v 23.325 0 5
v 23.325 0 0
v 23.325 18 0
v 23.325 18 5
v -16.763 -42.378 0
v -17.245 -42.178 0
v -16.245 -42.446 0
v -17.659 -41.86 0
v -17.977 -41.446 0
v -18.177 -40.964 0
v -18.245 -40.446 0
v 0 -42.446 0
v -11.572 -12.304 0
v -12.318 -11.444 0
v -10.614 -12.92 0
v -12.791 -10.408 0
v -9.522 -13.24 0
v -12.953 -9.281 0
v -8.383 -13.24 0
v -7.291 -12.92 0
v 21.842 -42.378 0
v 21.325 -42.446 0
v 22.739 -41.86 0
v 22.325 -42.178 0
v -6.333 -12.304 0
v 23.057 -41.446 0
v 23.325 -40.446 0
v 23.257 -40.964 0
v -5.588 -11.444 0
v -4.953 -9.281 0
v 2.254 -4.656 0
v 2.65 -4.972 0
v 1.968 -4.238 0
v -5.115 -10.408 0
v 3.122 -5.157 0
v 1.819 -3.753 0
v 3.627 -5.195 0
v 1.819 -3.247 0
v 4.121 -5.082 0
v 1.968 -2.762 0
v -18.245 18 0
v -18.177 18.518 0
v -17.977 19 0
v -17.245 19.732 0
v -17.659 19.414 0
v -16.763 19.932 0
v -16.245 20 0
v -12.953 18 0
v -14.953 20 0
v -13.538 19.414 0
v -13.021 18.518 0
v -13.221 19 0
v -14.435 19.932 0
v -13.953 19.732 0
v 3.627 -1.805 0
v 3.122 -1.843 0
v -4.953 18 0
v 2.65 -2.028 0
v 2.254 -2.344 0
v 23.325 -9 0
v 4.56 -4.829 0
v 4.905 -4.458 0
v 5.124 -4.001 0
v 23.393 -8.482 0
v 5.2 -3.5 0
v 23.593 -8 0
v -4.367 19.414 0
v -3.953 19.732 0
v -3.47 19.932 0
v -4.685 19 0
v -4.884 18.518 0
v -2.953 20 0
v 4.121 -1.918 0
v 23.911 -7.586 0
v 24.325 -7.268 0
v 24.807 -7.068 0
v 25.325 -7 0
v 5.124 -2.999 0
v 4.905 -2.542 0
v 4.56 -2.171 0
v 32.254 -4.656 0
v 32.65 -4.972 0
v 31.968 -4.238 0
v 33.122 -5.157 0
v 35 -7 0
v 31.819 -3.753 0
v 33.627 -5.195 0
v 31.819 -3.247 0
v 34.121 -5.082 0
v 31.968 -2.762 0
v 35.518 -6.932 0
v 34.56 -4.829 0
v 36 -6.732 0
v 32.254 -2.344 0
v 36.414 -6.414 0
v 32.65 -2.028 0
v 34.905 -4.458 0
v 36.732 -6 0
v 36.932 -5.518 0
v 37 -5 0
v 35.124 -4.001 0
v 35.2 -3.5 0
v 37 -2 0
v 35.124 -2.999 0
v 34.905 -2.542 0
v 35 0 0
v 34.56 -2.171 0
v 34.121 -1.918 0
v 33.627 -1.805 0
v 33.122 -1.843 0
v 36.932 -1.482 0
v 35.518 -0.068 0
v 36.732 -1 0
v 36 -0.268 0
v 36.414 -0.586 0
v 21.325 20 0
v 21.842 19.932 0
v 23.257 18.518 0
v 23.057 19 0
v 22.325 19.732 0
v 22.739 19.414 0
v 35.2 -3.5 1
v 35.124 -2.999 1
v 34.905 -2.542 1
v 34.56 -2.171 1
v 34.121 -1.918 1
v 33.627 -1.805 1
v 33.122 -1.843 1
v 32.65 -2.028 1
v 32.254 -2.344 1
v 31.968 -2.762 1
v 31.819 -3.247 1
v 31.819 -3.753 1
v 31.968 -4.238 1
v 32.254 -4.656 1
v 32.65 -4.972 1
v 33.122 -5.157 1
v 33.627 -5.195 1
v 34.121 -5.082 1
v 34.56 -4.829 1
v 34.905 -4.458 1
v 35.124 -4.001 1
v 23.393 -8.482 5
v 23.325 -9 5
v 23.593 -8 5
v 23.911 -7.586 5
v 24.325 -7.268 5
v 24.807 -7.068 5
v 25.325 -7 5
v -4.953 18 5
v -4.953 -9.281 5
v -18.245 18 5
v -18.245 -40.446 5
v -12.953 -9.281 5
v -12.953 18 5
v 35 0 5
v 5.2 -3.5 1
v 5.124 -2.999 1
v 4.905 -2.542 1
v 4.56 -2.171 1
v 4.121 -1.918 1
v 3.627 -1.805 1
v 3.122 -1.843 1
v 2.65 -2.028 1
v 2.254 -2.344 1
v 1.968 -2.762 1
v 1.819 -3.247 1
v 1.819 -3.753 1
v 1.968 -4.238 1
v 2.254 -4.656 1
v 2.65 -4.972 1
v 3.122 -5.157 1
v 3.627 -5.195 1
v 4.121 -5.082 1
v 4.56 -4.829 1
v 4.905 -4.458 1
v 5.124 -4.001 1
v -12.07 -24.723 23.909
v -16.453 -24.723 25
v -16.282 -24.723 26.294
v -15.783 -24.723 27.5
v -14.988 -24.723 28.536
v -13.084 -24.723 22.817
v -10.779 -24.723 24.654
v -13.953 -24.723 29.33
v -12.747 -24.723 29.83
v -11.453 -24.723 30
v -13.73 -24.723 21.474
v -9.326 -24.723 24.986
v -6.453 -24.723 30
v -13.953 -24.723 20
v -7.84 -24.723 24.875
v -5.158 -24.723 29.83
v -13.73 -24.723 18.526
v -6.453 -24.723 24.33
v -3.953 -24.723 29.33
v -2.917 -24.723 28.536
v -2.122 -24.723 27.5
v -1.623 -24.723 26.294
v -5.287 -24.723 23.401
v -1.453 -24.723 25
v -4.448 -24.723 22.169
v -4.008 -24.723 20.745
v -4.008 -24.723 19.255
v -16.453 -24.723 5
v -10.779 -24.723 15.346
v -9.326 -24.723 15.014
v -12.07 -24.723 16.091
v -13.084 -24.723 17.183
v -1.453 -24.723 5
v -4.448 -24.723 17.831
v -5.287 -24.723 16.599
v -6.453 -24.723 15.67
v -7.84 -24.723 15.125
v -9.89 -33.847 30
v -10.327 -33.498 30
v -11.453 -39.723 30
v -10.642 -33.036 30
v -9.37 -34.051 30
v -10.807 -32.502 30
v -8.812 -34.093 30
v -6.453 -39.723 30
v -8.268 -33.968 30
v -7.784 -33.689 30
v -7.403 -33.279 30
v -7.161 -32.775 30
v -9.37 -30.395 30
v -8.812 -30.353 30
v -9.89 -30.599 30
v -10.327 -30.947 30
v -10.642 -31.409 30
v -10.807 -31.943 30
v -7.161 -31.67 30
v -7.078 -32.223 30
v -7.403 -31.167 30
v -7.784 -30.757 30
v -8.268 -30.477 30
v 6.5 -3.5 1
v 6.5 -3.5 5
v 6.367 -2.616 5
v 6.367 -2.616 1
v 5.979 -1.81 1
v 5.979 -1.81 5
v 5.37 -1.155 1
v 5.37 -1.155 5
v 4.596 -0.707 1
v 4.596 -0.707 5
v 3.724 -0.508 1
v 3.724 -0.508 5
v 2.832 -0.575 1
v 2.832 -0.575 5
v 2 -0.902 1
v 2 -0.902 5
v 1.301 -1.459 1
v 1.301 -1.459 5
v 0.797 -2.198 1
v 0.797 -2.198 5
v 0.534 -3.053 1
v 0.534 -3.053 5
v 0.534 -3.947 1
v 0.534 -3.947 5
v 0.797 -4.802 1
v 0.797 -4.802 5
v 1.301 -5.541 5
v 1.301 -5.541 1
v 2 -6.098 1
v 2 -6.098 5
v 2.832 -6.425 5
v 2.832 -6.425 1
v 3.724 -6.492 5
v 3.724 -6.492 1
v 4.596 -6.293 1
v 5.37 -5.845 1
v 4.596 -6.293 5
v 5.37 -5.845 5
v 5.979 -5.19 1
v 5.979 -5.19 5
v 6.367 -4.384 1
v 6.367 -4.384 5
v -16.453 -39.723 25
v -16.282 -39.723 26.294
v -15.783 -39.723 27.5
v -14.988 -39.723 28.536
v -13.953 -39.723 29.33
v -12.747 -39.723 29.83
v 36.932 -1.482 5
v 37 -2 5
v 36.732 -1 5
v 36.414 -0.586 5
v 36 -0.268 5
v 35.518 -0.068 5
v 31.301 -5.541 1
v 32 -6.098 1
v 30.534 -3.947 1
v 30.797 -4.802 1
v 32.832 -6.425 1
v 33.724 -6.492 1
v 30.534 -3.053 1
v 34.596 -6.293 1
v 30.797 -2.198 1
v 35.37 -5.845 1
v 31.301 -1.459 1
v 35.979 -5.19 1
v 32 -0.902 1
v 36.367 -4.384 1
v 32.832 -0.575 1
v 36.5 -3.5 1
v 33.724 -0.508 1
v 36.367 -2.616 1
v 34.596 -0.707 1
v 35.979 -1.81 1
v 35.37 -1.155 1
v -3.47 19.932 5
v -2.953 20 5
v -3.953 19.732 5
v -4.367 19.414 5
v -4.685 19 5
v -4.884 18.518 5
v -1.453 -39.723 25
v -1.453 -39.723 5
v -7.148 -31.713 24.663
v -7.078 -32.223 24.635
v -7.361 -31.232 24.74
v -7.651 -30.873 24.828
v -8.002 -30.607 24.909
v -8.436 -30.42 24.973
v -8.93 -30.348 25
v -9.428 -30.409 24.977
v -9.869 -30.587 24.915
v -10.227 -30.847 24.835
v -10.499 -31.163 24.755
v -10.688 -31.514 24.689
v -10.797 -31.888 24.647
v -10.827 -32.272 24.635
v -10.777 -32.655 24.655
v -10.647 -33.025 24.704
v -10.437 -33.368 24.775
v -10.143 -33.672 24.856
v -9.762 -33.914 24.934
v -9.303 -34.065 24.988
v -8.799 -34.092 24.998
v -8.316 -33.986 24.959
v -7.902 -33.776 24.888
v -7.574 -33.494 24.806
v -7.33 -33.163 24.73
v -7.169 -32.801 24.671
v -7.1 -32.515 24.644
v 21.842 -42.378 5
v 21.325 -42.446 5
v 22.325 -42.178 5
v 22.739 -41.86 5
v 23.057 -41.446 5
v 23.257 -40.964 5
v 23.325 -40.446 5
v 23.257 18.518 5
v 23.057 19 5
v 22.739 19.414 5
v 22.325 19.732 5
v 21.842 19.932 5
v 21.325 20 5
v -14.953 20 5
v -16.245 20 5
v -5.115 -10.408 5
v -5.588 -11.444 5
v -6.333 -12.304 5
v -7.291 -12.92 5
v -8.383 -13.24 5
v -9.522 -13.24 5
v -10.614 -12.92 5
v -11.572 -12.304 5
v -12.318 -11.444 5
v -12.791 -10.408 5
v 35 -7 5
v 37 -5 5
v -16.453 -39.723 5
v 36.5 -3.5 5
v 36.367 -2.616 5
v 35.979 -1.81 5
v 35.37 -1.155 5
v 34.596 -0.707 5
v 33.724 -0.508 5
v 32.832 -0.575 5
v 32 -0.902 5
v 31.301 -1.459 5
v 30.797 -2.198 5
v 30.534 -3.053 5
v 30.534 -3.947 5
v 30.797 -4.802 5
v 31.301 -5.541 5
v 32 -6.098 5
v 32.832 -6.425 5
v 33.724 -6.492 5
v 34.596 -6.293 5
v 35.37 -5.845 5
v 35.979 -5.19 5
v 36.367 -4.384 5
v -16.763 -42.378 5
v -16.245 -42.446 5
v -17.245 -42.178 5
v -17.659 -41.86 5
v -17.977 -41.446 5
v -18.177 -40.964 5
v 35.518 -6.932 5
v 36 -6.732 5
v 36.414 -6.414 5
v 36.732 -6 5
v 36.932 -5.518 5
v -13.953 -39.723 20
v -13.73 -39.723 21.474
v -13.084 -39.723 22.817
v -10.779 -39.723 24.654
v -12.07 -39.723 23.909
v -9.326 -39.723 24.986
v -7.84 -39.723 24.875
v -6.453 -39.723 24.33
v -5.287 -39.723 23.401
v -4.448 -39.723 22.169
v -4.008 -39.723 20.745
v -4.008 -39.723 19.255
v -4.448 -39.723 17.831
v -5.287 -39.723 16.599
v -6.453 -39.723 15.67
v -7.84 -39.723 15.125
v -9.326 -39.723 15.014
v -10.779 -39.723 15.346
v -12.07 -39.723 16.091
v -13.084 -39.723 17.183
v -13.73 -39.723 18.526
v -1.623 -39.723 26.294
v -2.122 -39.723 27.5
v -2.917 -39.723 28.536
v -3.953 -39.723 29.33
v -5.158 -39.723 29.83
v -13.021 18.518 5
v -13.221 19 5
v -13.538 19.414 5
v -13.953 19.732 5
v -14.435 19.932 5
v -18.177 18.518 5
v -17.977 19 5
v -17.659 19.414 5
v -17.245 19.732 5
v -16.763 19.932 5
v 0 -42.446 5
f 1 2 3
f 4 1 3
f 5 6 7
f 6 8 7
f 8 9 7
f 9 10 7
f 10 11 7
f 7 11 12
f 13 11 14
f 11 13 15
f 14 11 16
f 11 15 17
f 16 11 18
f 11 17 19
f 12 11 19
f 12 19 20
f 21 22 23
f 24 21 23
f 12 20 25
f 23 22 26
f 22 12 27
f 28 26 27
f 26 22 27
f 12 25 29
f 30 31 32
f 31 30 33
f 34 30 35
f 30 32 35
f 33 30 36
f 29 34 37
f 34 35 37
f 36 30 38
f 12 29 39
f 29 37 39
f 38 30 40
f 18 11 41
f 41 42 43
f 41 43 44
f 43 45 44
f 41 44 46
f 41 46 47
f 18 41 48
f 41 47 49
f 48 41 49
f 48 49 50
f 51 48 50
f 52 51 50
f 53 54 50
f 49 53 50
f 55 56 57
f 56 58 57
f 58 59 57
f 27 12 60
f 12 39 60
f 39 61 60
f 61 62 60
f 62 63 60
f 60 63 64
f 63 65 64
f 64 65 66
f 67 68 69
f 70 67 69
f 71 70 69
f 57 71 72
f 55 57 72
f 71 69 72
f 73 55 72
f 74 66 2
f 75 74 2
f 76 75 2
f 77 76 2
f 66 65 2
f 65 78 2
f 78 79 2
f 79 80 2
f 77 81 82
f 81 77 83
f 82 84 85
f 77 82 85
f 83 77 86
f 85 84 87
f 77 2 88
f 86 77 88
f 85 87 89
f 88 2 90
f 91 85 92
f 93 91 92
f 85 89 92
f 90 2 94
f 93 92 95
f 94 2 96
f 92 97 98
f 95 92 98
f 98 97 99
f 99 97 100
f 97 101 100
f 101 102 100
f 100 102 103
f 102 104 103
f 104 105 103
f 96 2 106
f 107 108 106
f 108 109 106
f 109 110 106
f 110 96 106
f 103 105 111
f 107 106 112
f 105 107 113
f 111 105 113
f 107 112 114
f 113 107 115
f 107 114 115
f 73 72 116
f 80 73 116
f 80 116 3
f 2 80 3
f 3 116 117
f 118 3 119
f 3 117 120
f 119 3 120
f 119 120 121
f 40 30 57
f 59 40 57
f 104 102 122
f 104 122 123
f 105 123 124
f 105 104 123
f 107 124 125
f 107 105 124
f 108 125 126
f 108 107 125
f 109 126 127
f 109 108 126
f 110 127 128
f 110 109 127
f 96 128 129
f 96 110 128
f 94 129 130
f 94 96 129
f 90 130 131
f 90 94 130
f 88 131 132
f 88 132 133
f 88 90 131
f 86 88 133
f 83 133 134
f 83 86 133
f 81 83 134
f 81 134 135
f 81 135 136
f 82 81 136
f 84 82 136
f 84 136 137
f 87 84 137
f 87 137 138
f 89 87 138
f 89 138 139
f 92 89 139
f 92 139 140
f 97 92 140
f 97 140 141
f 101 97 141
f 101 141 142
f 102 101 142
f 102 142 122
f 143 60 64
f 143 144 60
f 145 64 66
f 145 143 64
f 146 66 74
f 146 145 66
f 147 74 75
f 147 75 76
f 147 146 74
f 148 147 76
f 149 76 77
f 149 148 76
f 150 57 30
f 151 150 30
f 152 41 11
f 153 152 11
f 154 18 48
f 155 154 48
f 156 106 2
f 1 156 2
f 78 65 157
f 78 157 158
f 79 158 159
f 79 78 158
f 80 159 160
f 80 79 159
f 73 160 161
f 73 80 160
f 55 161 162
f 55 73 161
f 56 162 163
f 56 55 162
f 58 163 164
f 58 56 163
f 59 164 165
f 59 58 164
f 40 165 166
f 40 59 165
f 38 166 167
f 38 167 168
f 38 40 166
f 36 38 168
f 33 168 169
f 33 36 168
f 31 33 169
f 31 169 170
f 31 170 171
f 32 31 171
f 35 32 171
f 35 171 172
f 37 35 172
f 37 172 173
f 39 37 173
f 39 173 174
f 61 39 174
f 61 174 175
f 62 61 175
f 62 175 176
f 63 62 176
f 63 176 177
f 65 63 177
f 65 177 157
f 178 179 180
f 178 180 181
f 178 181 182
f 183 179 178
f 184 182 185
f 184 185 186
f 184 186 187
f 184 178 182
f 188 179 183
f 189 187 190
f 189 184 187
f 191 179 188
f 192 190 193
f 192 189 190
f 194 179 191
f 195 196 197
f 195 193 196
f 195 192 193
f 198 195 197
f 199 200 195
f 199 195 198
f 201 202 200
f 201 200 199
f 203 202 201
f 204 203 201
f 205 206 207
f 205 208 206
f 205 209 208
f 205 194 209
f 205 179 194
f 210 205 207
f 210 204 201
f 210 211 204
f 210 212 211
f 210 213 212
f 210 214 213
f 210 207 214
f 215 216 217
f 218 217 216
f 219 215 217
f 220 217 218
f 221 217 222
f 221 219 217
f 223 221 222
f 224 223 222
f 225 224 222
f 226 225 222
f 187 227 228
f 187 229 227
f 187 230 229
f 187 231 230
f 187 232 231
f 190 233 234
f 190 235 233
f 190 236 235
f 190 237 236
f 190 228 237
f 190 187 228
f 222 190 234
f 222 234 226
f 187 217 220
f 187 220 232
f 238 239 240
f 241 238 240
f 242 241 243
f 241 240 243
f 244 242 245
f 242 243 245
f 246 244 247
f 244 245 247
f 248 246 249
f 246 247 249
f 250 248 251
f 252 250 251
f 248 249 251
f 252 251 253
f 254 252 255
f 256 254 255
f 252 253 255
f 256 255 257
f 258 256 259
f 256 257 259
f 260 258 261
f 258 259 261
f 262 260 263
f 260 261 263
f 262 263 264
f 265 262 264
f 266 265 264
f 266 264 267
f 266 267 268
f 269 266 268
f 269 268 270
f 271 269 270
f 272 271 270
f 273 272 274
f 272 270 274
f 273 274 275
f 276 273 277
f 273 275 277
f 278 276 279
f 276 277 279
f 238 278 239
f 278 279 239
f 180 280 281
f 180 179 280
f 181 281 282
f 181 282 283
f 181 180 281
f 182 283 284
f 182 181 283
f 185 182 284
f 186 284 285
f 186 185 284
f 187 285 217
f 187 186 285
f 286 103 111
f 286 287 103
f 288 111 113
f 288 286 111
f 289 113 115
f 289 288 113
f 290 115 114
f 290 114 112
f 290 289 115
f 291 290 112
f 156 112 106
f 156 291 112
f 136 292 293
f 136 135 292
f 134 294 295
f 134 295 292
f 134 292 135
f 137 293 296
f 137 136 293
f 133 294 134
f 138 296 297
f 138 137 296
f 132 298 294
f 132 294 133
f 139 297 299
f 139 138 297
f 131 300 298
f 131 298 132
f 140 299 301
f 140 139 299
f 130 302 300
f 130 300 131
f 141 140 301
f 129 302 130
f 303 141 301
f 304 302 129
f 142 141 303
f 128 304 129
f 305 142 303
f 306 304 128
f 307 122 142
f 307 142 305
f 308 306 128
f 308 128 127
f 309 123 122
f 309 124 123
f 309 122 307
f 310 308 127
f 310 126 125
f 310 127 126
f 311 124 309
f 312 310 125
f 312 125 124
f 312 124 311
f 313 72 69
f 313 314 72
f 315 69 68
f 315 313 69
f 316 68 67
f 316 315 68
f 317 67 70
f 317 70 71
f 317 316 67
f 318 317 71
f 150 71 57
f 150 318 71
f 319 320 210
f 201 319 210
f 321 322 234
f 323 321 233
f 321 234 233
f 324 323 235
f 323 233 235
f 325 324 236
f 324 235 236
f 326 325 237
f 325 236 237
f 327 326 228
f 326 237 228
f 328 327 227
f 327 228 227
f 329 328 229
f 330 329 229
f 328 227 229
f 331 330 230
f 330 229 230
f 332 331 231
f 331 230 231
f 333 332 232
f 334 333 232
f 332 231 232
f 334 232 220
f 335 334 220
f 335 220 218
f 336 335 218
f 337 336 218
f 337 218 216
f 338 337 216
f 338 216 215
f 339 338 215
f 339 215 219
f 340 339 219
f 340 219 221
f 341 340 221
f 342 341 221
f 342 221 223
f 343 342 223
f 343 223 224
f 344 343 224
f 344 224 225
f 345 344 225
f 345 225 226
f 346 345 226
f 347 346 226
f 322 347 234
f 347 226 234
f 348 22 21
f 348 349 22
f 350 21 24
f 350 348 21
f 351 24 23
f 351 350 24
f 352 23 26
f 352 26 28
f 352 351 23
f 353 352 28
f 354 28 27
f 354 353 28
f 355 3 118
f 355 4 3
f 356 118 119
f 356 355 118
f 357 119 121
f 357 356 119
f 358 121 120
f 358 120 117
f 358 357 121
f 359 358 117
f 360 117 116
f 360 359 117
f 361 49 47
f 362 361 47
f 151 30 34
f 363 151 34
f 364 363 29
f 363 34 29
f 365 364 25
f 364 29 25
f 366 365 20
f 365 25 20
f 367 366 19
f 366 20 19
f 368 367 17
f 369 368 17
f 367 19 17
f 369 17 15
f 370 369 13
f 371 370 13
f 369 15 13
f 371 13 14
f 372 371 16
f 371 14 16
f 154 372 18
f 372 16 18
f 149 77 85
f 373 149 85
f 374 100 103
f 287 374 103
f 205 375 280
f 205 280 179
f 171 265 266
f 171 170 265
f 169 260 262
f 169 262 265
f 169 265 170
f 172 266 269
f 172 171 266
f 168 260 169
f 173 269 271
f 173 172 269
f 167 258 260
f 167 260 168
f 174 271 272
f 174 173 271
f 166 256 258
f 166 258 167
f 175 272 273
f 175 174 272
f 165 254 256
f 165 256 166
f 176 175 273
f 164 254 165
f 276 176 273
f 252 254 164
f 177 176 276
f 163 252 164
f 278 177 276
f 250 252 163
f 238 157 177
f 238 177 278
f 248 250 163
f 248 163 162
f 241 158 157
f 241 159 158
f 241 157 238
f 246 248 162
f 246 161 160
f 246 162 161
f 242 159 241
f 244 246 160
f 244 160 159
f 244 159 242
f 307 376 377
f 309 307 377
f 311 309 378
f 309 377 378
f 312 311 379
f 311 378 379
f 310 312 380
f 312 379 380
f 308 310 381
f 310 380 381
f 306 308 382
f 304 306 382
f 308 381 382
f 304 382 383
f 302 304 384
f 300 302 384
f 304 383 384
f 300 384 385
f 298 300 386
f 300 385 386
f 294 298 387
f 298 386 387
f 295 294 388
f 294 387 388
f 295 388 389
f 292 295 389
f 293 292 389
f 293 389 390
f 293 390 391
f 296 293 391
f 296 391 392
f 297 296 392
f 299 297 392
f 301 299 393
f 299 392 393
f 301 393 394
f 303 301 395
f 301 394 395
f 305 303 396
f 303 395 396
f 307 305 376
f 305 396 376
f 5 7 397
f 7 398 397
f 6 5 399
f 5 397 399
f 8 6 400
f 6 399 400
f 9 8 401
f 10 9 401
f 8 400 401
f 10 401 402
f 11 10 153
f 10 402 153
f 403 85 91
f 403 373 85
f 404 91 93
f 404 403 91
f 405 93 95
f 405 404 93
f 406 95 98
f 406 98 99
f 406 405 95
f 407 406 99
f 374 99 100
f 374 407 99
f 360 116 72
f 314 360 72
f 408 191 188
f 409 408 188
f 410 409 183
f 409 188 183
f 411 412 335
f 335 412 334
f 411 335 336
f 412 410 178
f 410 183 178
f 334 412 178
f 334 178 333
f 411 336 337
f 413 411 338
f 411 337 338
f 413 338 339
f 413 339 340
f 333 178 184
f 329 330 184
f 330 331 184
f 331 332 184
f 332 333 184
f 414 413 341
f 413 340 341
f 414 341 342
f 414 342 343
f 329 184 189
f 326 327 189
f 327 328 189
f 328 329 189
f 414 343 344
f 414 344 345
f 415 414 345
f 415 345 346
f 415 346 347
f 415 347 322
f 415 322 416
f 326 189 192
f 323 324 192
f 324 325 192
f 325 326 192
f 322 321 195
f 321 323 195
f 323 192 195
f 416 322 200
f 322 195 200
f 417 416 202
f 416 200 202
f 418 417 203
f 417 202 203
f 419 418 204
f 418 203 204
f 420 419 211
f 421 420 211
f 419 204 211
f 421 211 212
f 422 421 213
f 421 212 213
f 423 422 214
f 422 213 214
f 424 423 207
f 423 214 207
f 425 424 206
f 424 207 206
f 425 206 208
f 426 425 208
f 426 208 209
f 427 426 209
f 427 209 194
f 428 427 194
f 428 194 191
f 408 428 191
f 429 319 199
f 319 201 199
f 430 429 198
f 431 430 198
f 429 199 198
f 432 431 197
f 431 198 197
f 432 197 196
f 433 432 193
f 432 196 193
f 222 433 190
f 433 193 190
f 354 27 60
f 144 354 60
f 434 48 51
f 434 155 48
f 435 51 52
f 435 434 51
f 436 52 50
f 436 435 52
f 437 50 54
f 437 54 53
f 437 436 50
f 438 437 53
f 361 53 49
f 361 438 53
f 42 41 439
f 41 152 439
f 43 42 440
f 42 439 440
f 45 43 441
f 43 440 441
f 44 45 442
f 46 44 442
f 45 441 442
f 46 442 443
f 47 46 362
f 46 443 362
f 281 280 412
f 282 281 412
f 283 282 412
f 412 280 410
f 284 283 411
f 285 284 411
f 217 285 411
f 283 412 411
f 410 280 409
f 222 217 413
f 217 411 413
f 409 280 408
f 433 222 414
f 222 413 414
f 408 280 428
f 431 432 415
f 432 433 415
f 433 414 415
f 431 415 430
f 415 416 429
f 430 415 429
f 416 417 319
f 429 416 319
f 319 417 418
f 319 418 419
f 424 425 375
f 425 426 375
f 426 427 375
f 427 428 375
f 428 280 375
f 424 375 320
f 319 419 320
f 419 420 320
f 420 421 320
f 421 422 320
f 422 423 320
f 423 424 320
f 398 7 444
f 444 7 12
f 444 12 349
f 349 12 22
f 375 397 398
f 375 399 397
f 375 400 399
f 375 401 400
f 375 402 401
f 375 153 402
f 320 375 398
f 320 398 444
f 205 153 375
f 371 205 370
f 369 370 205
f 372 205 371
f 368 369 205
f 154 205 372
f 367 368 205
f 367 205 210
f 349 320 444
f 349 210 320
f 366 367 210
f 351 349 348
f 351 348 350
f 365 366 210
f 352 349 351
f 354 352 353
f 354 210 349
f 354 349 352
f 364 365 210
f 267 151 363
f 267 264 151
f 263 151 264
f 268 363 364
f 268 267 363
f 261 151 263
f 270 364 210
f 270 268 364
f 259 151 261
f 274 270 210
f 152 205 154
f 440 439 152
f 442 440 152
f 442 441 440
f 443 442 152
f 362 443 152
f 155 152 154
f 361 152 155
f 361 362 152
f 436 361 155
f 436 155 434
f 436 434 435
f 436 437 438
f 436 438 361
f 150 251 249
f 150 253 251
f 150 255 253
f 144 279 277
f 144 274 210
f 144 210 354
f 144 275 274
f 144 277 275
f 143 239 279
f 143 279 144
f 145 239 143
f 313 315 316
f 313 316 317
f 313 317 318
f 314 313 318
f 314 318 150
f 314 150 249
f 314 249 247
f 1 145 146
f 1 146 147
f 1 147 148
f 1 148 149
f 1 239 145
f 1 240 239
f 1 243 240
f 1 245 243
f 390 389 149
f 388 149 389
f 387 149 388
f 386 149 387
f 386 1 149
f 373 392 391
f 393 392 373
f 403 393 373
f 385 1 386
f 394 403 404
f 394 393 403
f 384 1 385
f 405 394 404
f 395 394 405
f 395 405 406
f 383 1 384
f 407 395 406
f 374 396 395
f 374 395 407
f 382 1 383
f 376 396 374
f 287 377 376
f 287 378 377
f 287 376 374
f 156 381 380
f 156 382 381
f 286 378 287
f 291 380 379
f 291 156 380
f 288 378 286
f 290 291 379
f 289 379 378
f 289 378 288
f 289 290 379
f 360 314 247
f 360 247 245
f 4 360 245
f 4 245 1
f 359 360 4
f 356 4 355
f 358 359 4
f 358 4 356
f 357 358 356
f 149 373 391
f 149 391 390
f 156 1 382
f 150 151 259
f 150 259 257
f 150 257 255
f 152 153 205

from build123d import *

# Parameters (mm, degrees)
F0_R      = 1.7
F0_W      = 23.3248192817
F0_H      = 35.4459092319
F0_H_2    = 20
F1_DEPTH  = 5
F2_R      = 3
F2_R_2    = 1.7
F3_DEPTH  = 4
F4_W      = 15
F4_H      = 15
F5_DEPTH  = 25
F6_R      = 5
F7_DEPTH  = 15
F8_R      = 2
F9_R      = 1.875
F10_DEPTH = 7
F11_R     = 5


with BuildPart() as f1:
    # F0 (on Top) → F1 (new body)
    with BuildSketch(Plane.XY):
        Polygon((23.3248192817, 0), (0, 0), (0, -7), (23.3248192817, -7), (37, -7), (37, 0), align=None)
        with Locations((3.5, -3.5)):
            Circle(F0_R, mode=Mode.SUBTRACT)
        with Locations((33.5, -3.5)):
            Circle(F0_R, mode=Mode.SUBTRACT)
        with Locations((11.6624096408, -24.722954616)):
            Rectangle(F0_W, F0_H)
        with Locations((11.6624096408, 10)):
            Rectangle(F0_W, F0_H_2)
        with BuildLine():
            Line((0, -7), (0, 0))
            Line((0, 0), (0, 20))
            Line((0, 20), (-4.9525605589, 20))
            Line((-4.9525605589, 20), (-4.9525605589, -9.2811752111))
            ThreePointArc((-4.9525605589, -9.2811752111), (-8.9525605589, -13.2811752111), (-12.9525605589, -9.2811752111))
            Line((-12.9525605589, -9.2811752111), (-12.9525605589, 20))
            Line((-12.9525605589, 20), (-18.2450078428, 20))
            Line((-18.2450078428, 20), (-18.2450078428, -42.4459092319))
            Line((-18.2450078428, -42.4459092319), (0, -42.4459092319))
            Line((0, -42.4459092319), (0, -7))
        make_face()
    extrude(amount=F1_DEPTH)

    # F2 (on face) → F3 (cut)
    with BuildSketch(Plane.XY.offset(5)):
        with Locations((3.5, -3.5)):
            Circle(F2_R)
        with Locations((3.5, -3.5)):
            Circle(F2_R_2, mode=Mode.SUBTRACT)
        with Locations((33.5, -3.5)):
            Circle(F2_R)
        with Locations((33.5, -3.5)):
            Circle(F2_R_2, mode=Mode.SUBTRACT)
    extrude(amount=-F3_DEPTH, mode=Mode.SUBTRACT)

    # F4 (on face) → F5 (join)
    with BuildSketch(Plane.XY.offset(5)):
        with Locations((-8.9525605589, -32.2227959335)):
            Rectangle(F4_W, F4_H)
    extrude(amount=F5_DEPTH)

    # F6 (on face) → F7 (cut)
    with BuildSketch(Plane(origin=(0, -24.7227959335, 0), x_dir=(-1, 0, 0), z_dir=(0, 1, 0))):
        with Locations((8.9525605589, 20)):
            Circle(F6_R)
    extrude(amount=-F7_DEPTH, mode=Mode.SUBTRACT)

    # F8
    f8_edges = [f1.edges().sort_by_distance(p)[0] for p in [
        (23.324819, 20, 2.5),
        (37, 0, 2.5),
        (37, -7, 2.5),
        (23.324819, -42.445909, 2.5),
        (-18.245008, 20, 2.5),
        (-18.245008, -42.445909, 2.5),
        (23.324819, -7, 2.5),
        (-4.952561, 20, 2.5),
        (-12.952561, 20, 2.5),
    ]]
    fillet(f8_edges, radius=F8_R)

    # F9 (on face) → F10 (cut)
    with BuildSketch(Plane.XY.offset(30)):
        with Locations((-8.9525605589, -32.2227959335)):
            Circle(F9_R)
    extrude(amount=-F10_DEPTH, mode=Mode.SUBTRACT)

    # F11
    f11_edges = [f1.edges().sort_by_distance(p)[0] for p in [
        (-1.452561, -32.222796, 30),
        (-16.452561, -32.222796, 30),
    ]]
    fillet(f11_edges, radius=F11_R)


solid = f1.part
